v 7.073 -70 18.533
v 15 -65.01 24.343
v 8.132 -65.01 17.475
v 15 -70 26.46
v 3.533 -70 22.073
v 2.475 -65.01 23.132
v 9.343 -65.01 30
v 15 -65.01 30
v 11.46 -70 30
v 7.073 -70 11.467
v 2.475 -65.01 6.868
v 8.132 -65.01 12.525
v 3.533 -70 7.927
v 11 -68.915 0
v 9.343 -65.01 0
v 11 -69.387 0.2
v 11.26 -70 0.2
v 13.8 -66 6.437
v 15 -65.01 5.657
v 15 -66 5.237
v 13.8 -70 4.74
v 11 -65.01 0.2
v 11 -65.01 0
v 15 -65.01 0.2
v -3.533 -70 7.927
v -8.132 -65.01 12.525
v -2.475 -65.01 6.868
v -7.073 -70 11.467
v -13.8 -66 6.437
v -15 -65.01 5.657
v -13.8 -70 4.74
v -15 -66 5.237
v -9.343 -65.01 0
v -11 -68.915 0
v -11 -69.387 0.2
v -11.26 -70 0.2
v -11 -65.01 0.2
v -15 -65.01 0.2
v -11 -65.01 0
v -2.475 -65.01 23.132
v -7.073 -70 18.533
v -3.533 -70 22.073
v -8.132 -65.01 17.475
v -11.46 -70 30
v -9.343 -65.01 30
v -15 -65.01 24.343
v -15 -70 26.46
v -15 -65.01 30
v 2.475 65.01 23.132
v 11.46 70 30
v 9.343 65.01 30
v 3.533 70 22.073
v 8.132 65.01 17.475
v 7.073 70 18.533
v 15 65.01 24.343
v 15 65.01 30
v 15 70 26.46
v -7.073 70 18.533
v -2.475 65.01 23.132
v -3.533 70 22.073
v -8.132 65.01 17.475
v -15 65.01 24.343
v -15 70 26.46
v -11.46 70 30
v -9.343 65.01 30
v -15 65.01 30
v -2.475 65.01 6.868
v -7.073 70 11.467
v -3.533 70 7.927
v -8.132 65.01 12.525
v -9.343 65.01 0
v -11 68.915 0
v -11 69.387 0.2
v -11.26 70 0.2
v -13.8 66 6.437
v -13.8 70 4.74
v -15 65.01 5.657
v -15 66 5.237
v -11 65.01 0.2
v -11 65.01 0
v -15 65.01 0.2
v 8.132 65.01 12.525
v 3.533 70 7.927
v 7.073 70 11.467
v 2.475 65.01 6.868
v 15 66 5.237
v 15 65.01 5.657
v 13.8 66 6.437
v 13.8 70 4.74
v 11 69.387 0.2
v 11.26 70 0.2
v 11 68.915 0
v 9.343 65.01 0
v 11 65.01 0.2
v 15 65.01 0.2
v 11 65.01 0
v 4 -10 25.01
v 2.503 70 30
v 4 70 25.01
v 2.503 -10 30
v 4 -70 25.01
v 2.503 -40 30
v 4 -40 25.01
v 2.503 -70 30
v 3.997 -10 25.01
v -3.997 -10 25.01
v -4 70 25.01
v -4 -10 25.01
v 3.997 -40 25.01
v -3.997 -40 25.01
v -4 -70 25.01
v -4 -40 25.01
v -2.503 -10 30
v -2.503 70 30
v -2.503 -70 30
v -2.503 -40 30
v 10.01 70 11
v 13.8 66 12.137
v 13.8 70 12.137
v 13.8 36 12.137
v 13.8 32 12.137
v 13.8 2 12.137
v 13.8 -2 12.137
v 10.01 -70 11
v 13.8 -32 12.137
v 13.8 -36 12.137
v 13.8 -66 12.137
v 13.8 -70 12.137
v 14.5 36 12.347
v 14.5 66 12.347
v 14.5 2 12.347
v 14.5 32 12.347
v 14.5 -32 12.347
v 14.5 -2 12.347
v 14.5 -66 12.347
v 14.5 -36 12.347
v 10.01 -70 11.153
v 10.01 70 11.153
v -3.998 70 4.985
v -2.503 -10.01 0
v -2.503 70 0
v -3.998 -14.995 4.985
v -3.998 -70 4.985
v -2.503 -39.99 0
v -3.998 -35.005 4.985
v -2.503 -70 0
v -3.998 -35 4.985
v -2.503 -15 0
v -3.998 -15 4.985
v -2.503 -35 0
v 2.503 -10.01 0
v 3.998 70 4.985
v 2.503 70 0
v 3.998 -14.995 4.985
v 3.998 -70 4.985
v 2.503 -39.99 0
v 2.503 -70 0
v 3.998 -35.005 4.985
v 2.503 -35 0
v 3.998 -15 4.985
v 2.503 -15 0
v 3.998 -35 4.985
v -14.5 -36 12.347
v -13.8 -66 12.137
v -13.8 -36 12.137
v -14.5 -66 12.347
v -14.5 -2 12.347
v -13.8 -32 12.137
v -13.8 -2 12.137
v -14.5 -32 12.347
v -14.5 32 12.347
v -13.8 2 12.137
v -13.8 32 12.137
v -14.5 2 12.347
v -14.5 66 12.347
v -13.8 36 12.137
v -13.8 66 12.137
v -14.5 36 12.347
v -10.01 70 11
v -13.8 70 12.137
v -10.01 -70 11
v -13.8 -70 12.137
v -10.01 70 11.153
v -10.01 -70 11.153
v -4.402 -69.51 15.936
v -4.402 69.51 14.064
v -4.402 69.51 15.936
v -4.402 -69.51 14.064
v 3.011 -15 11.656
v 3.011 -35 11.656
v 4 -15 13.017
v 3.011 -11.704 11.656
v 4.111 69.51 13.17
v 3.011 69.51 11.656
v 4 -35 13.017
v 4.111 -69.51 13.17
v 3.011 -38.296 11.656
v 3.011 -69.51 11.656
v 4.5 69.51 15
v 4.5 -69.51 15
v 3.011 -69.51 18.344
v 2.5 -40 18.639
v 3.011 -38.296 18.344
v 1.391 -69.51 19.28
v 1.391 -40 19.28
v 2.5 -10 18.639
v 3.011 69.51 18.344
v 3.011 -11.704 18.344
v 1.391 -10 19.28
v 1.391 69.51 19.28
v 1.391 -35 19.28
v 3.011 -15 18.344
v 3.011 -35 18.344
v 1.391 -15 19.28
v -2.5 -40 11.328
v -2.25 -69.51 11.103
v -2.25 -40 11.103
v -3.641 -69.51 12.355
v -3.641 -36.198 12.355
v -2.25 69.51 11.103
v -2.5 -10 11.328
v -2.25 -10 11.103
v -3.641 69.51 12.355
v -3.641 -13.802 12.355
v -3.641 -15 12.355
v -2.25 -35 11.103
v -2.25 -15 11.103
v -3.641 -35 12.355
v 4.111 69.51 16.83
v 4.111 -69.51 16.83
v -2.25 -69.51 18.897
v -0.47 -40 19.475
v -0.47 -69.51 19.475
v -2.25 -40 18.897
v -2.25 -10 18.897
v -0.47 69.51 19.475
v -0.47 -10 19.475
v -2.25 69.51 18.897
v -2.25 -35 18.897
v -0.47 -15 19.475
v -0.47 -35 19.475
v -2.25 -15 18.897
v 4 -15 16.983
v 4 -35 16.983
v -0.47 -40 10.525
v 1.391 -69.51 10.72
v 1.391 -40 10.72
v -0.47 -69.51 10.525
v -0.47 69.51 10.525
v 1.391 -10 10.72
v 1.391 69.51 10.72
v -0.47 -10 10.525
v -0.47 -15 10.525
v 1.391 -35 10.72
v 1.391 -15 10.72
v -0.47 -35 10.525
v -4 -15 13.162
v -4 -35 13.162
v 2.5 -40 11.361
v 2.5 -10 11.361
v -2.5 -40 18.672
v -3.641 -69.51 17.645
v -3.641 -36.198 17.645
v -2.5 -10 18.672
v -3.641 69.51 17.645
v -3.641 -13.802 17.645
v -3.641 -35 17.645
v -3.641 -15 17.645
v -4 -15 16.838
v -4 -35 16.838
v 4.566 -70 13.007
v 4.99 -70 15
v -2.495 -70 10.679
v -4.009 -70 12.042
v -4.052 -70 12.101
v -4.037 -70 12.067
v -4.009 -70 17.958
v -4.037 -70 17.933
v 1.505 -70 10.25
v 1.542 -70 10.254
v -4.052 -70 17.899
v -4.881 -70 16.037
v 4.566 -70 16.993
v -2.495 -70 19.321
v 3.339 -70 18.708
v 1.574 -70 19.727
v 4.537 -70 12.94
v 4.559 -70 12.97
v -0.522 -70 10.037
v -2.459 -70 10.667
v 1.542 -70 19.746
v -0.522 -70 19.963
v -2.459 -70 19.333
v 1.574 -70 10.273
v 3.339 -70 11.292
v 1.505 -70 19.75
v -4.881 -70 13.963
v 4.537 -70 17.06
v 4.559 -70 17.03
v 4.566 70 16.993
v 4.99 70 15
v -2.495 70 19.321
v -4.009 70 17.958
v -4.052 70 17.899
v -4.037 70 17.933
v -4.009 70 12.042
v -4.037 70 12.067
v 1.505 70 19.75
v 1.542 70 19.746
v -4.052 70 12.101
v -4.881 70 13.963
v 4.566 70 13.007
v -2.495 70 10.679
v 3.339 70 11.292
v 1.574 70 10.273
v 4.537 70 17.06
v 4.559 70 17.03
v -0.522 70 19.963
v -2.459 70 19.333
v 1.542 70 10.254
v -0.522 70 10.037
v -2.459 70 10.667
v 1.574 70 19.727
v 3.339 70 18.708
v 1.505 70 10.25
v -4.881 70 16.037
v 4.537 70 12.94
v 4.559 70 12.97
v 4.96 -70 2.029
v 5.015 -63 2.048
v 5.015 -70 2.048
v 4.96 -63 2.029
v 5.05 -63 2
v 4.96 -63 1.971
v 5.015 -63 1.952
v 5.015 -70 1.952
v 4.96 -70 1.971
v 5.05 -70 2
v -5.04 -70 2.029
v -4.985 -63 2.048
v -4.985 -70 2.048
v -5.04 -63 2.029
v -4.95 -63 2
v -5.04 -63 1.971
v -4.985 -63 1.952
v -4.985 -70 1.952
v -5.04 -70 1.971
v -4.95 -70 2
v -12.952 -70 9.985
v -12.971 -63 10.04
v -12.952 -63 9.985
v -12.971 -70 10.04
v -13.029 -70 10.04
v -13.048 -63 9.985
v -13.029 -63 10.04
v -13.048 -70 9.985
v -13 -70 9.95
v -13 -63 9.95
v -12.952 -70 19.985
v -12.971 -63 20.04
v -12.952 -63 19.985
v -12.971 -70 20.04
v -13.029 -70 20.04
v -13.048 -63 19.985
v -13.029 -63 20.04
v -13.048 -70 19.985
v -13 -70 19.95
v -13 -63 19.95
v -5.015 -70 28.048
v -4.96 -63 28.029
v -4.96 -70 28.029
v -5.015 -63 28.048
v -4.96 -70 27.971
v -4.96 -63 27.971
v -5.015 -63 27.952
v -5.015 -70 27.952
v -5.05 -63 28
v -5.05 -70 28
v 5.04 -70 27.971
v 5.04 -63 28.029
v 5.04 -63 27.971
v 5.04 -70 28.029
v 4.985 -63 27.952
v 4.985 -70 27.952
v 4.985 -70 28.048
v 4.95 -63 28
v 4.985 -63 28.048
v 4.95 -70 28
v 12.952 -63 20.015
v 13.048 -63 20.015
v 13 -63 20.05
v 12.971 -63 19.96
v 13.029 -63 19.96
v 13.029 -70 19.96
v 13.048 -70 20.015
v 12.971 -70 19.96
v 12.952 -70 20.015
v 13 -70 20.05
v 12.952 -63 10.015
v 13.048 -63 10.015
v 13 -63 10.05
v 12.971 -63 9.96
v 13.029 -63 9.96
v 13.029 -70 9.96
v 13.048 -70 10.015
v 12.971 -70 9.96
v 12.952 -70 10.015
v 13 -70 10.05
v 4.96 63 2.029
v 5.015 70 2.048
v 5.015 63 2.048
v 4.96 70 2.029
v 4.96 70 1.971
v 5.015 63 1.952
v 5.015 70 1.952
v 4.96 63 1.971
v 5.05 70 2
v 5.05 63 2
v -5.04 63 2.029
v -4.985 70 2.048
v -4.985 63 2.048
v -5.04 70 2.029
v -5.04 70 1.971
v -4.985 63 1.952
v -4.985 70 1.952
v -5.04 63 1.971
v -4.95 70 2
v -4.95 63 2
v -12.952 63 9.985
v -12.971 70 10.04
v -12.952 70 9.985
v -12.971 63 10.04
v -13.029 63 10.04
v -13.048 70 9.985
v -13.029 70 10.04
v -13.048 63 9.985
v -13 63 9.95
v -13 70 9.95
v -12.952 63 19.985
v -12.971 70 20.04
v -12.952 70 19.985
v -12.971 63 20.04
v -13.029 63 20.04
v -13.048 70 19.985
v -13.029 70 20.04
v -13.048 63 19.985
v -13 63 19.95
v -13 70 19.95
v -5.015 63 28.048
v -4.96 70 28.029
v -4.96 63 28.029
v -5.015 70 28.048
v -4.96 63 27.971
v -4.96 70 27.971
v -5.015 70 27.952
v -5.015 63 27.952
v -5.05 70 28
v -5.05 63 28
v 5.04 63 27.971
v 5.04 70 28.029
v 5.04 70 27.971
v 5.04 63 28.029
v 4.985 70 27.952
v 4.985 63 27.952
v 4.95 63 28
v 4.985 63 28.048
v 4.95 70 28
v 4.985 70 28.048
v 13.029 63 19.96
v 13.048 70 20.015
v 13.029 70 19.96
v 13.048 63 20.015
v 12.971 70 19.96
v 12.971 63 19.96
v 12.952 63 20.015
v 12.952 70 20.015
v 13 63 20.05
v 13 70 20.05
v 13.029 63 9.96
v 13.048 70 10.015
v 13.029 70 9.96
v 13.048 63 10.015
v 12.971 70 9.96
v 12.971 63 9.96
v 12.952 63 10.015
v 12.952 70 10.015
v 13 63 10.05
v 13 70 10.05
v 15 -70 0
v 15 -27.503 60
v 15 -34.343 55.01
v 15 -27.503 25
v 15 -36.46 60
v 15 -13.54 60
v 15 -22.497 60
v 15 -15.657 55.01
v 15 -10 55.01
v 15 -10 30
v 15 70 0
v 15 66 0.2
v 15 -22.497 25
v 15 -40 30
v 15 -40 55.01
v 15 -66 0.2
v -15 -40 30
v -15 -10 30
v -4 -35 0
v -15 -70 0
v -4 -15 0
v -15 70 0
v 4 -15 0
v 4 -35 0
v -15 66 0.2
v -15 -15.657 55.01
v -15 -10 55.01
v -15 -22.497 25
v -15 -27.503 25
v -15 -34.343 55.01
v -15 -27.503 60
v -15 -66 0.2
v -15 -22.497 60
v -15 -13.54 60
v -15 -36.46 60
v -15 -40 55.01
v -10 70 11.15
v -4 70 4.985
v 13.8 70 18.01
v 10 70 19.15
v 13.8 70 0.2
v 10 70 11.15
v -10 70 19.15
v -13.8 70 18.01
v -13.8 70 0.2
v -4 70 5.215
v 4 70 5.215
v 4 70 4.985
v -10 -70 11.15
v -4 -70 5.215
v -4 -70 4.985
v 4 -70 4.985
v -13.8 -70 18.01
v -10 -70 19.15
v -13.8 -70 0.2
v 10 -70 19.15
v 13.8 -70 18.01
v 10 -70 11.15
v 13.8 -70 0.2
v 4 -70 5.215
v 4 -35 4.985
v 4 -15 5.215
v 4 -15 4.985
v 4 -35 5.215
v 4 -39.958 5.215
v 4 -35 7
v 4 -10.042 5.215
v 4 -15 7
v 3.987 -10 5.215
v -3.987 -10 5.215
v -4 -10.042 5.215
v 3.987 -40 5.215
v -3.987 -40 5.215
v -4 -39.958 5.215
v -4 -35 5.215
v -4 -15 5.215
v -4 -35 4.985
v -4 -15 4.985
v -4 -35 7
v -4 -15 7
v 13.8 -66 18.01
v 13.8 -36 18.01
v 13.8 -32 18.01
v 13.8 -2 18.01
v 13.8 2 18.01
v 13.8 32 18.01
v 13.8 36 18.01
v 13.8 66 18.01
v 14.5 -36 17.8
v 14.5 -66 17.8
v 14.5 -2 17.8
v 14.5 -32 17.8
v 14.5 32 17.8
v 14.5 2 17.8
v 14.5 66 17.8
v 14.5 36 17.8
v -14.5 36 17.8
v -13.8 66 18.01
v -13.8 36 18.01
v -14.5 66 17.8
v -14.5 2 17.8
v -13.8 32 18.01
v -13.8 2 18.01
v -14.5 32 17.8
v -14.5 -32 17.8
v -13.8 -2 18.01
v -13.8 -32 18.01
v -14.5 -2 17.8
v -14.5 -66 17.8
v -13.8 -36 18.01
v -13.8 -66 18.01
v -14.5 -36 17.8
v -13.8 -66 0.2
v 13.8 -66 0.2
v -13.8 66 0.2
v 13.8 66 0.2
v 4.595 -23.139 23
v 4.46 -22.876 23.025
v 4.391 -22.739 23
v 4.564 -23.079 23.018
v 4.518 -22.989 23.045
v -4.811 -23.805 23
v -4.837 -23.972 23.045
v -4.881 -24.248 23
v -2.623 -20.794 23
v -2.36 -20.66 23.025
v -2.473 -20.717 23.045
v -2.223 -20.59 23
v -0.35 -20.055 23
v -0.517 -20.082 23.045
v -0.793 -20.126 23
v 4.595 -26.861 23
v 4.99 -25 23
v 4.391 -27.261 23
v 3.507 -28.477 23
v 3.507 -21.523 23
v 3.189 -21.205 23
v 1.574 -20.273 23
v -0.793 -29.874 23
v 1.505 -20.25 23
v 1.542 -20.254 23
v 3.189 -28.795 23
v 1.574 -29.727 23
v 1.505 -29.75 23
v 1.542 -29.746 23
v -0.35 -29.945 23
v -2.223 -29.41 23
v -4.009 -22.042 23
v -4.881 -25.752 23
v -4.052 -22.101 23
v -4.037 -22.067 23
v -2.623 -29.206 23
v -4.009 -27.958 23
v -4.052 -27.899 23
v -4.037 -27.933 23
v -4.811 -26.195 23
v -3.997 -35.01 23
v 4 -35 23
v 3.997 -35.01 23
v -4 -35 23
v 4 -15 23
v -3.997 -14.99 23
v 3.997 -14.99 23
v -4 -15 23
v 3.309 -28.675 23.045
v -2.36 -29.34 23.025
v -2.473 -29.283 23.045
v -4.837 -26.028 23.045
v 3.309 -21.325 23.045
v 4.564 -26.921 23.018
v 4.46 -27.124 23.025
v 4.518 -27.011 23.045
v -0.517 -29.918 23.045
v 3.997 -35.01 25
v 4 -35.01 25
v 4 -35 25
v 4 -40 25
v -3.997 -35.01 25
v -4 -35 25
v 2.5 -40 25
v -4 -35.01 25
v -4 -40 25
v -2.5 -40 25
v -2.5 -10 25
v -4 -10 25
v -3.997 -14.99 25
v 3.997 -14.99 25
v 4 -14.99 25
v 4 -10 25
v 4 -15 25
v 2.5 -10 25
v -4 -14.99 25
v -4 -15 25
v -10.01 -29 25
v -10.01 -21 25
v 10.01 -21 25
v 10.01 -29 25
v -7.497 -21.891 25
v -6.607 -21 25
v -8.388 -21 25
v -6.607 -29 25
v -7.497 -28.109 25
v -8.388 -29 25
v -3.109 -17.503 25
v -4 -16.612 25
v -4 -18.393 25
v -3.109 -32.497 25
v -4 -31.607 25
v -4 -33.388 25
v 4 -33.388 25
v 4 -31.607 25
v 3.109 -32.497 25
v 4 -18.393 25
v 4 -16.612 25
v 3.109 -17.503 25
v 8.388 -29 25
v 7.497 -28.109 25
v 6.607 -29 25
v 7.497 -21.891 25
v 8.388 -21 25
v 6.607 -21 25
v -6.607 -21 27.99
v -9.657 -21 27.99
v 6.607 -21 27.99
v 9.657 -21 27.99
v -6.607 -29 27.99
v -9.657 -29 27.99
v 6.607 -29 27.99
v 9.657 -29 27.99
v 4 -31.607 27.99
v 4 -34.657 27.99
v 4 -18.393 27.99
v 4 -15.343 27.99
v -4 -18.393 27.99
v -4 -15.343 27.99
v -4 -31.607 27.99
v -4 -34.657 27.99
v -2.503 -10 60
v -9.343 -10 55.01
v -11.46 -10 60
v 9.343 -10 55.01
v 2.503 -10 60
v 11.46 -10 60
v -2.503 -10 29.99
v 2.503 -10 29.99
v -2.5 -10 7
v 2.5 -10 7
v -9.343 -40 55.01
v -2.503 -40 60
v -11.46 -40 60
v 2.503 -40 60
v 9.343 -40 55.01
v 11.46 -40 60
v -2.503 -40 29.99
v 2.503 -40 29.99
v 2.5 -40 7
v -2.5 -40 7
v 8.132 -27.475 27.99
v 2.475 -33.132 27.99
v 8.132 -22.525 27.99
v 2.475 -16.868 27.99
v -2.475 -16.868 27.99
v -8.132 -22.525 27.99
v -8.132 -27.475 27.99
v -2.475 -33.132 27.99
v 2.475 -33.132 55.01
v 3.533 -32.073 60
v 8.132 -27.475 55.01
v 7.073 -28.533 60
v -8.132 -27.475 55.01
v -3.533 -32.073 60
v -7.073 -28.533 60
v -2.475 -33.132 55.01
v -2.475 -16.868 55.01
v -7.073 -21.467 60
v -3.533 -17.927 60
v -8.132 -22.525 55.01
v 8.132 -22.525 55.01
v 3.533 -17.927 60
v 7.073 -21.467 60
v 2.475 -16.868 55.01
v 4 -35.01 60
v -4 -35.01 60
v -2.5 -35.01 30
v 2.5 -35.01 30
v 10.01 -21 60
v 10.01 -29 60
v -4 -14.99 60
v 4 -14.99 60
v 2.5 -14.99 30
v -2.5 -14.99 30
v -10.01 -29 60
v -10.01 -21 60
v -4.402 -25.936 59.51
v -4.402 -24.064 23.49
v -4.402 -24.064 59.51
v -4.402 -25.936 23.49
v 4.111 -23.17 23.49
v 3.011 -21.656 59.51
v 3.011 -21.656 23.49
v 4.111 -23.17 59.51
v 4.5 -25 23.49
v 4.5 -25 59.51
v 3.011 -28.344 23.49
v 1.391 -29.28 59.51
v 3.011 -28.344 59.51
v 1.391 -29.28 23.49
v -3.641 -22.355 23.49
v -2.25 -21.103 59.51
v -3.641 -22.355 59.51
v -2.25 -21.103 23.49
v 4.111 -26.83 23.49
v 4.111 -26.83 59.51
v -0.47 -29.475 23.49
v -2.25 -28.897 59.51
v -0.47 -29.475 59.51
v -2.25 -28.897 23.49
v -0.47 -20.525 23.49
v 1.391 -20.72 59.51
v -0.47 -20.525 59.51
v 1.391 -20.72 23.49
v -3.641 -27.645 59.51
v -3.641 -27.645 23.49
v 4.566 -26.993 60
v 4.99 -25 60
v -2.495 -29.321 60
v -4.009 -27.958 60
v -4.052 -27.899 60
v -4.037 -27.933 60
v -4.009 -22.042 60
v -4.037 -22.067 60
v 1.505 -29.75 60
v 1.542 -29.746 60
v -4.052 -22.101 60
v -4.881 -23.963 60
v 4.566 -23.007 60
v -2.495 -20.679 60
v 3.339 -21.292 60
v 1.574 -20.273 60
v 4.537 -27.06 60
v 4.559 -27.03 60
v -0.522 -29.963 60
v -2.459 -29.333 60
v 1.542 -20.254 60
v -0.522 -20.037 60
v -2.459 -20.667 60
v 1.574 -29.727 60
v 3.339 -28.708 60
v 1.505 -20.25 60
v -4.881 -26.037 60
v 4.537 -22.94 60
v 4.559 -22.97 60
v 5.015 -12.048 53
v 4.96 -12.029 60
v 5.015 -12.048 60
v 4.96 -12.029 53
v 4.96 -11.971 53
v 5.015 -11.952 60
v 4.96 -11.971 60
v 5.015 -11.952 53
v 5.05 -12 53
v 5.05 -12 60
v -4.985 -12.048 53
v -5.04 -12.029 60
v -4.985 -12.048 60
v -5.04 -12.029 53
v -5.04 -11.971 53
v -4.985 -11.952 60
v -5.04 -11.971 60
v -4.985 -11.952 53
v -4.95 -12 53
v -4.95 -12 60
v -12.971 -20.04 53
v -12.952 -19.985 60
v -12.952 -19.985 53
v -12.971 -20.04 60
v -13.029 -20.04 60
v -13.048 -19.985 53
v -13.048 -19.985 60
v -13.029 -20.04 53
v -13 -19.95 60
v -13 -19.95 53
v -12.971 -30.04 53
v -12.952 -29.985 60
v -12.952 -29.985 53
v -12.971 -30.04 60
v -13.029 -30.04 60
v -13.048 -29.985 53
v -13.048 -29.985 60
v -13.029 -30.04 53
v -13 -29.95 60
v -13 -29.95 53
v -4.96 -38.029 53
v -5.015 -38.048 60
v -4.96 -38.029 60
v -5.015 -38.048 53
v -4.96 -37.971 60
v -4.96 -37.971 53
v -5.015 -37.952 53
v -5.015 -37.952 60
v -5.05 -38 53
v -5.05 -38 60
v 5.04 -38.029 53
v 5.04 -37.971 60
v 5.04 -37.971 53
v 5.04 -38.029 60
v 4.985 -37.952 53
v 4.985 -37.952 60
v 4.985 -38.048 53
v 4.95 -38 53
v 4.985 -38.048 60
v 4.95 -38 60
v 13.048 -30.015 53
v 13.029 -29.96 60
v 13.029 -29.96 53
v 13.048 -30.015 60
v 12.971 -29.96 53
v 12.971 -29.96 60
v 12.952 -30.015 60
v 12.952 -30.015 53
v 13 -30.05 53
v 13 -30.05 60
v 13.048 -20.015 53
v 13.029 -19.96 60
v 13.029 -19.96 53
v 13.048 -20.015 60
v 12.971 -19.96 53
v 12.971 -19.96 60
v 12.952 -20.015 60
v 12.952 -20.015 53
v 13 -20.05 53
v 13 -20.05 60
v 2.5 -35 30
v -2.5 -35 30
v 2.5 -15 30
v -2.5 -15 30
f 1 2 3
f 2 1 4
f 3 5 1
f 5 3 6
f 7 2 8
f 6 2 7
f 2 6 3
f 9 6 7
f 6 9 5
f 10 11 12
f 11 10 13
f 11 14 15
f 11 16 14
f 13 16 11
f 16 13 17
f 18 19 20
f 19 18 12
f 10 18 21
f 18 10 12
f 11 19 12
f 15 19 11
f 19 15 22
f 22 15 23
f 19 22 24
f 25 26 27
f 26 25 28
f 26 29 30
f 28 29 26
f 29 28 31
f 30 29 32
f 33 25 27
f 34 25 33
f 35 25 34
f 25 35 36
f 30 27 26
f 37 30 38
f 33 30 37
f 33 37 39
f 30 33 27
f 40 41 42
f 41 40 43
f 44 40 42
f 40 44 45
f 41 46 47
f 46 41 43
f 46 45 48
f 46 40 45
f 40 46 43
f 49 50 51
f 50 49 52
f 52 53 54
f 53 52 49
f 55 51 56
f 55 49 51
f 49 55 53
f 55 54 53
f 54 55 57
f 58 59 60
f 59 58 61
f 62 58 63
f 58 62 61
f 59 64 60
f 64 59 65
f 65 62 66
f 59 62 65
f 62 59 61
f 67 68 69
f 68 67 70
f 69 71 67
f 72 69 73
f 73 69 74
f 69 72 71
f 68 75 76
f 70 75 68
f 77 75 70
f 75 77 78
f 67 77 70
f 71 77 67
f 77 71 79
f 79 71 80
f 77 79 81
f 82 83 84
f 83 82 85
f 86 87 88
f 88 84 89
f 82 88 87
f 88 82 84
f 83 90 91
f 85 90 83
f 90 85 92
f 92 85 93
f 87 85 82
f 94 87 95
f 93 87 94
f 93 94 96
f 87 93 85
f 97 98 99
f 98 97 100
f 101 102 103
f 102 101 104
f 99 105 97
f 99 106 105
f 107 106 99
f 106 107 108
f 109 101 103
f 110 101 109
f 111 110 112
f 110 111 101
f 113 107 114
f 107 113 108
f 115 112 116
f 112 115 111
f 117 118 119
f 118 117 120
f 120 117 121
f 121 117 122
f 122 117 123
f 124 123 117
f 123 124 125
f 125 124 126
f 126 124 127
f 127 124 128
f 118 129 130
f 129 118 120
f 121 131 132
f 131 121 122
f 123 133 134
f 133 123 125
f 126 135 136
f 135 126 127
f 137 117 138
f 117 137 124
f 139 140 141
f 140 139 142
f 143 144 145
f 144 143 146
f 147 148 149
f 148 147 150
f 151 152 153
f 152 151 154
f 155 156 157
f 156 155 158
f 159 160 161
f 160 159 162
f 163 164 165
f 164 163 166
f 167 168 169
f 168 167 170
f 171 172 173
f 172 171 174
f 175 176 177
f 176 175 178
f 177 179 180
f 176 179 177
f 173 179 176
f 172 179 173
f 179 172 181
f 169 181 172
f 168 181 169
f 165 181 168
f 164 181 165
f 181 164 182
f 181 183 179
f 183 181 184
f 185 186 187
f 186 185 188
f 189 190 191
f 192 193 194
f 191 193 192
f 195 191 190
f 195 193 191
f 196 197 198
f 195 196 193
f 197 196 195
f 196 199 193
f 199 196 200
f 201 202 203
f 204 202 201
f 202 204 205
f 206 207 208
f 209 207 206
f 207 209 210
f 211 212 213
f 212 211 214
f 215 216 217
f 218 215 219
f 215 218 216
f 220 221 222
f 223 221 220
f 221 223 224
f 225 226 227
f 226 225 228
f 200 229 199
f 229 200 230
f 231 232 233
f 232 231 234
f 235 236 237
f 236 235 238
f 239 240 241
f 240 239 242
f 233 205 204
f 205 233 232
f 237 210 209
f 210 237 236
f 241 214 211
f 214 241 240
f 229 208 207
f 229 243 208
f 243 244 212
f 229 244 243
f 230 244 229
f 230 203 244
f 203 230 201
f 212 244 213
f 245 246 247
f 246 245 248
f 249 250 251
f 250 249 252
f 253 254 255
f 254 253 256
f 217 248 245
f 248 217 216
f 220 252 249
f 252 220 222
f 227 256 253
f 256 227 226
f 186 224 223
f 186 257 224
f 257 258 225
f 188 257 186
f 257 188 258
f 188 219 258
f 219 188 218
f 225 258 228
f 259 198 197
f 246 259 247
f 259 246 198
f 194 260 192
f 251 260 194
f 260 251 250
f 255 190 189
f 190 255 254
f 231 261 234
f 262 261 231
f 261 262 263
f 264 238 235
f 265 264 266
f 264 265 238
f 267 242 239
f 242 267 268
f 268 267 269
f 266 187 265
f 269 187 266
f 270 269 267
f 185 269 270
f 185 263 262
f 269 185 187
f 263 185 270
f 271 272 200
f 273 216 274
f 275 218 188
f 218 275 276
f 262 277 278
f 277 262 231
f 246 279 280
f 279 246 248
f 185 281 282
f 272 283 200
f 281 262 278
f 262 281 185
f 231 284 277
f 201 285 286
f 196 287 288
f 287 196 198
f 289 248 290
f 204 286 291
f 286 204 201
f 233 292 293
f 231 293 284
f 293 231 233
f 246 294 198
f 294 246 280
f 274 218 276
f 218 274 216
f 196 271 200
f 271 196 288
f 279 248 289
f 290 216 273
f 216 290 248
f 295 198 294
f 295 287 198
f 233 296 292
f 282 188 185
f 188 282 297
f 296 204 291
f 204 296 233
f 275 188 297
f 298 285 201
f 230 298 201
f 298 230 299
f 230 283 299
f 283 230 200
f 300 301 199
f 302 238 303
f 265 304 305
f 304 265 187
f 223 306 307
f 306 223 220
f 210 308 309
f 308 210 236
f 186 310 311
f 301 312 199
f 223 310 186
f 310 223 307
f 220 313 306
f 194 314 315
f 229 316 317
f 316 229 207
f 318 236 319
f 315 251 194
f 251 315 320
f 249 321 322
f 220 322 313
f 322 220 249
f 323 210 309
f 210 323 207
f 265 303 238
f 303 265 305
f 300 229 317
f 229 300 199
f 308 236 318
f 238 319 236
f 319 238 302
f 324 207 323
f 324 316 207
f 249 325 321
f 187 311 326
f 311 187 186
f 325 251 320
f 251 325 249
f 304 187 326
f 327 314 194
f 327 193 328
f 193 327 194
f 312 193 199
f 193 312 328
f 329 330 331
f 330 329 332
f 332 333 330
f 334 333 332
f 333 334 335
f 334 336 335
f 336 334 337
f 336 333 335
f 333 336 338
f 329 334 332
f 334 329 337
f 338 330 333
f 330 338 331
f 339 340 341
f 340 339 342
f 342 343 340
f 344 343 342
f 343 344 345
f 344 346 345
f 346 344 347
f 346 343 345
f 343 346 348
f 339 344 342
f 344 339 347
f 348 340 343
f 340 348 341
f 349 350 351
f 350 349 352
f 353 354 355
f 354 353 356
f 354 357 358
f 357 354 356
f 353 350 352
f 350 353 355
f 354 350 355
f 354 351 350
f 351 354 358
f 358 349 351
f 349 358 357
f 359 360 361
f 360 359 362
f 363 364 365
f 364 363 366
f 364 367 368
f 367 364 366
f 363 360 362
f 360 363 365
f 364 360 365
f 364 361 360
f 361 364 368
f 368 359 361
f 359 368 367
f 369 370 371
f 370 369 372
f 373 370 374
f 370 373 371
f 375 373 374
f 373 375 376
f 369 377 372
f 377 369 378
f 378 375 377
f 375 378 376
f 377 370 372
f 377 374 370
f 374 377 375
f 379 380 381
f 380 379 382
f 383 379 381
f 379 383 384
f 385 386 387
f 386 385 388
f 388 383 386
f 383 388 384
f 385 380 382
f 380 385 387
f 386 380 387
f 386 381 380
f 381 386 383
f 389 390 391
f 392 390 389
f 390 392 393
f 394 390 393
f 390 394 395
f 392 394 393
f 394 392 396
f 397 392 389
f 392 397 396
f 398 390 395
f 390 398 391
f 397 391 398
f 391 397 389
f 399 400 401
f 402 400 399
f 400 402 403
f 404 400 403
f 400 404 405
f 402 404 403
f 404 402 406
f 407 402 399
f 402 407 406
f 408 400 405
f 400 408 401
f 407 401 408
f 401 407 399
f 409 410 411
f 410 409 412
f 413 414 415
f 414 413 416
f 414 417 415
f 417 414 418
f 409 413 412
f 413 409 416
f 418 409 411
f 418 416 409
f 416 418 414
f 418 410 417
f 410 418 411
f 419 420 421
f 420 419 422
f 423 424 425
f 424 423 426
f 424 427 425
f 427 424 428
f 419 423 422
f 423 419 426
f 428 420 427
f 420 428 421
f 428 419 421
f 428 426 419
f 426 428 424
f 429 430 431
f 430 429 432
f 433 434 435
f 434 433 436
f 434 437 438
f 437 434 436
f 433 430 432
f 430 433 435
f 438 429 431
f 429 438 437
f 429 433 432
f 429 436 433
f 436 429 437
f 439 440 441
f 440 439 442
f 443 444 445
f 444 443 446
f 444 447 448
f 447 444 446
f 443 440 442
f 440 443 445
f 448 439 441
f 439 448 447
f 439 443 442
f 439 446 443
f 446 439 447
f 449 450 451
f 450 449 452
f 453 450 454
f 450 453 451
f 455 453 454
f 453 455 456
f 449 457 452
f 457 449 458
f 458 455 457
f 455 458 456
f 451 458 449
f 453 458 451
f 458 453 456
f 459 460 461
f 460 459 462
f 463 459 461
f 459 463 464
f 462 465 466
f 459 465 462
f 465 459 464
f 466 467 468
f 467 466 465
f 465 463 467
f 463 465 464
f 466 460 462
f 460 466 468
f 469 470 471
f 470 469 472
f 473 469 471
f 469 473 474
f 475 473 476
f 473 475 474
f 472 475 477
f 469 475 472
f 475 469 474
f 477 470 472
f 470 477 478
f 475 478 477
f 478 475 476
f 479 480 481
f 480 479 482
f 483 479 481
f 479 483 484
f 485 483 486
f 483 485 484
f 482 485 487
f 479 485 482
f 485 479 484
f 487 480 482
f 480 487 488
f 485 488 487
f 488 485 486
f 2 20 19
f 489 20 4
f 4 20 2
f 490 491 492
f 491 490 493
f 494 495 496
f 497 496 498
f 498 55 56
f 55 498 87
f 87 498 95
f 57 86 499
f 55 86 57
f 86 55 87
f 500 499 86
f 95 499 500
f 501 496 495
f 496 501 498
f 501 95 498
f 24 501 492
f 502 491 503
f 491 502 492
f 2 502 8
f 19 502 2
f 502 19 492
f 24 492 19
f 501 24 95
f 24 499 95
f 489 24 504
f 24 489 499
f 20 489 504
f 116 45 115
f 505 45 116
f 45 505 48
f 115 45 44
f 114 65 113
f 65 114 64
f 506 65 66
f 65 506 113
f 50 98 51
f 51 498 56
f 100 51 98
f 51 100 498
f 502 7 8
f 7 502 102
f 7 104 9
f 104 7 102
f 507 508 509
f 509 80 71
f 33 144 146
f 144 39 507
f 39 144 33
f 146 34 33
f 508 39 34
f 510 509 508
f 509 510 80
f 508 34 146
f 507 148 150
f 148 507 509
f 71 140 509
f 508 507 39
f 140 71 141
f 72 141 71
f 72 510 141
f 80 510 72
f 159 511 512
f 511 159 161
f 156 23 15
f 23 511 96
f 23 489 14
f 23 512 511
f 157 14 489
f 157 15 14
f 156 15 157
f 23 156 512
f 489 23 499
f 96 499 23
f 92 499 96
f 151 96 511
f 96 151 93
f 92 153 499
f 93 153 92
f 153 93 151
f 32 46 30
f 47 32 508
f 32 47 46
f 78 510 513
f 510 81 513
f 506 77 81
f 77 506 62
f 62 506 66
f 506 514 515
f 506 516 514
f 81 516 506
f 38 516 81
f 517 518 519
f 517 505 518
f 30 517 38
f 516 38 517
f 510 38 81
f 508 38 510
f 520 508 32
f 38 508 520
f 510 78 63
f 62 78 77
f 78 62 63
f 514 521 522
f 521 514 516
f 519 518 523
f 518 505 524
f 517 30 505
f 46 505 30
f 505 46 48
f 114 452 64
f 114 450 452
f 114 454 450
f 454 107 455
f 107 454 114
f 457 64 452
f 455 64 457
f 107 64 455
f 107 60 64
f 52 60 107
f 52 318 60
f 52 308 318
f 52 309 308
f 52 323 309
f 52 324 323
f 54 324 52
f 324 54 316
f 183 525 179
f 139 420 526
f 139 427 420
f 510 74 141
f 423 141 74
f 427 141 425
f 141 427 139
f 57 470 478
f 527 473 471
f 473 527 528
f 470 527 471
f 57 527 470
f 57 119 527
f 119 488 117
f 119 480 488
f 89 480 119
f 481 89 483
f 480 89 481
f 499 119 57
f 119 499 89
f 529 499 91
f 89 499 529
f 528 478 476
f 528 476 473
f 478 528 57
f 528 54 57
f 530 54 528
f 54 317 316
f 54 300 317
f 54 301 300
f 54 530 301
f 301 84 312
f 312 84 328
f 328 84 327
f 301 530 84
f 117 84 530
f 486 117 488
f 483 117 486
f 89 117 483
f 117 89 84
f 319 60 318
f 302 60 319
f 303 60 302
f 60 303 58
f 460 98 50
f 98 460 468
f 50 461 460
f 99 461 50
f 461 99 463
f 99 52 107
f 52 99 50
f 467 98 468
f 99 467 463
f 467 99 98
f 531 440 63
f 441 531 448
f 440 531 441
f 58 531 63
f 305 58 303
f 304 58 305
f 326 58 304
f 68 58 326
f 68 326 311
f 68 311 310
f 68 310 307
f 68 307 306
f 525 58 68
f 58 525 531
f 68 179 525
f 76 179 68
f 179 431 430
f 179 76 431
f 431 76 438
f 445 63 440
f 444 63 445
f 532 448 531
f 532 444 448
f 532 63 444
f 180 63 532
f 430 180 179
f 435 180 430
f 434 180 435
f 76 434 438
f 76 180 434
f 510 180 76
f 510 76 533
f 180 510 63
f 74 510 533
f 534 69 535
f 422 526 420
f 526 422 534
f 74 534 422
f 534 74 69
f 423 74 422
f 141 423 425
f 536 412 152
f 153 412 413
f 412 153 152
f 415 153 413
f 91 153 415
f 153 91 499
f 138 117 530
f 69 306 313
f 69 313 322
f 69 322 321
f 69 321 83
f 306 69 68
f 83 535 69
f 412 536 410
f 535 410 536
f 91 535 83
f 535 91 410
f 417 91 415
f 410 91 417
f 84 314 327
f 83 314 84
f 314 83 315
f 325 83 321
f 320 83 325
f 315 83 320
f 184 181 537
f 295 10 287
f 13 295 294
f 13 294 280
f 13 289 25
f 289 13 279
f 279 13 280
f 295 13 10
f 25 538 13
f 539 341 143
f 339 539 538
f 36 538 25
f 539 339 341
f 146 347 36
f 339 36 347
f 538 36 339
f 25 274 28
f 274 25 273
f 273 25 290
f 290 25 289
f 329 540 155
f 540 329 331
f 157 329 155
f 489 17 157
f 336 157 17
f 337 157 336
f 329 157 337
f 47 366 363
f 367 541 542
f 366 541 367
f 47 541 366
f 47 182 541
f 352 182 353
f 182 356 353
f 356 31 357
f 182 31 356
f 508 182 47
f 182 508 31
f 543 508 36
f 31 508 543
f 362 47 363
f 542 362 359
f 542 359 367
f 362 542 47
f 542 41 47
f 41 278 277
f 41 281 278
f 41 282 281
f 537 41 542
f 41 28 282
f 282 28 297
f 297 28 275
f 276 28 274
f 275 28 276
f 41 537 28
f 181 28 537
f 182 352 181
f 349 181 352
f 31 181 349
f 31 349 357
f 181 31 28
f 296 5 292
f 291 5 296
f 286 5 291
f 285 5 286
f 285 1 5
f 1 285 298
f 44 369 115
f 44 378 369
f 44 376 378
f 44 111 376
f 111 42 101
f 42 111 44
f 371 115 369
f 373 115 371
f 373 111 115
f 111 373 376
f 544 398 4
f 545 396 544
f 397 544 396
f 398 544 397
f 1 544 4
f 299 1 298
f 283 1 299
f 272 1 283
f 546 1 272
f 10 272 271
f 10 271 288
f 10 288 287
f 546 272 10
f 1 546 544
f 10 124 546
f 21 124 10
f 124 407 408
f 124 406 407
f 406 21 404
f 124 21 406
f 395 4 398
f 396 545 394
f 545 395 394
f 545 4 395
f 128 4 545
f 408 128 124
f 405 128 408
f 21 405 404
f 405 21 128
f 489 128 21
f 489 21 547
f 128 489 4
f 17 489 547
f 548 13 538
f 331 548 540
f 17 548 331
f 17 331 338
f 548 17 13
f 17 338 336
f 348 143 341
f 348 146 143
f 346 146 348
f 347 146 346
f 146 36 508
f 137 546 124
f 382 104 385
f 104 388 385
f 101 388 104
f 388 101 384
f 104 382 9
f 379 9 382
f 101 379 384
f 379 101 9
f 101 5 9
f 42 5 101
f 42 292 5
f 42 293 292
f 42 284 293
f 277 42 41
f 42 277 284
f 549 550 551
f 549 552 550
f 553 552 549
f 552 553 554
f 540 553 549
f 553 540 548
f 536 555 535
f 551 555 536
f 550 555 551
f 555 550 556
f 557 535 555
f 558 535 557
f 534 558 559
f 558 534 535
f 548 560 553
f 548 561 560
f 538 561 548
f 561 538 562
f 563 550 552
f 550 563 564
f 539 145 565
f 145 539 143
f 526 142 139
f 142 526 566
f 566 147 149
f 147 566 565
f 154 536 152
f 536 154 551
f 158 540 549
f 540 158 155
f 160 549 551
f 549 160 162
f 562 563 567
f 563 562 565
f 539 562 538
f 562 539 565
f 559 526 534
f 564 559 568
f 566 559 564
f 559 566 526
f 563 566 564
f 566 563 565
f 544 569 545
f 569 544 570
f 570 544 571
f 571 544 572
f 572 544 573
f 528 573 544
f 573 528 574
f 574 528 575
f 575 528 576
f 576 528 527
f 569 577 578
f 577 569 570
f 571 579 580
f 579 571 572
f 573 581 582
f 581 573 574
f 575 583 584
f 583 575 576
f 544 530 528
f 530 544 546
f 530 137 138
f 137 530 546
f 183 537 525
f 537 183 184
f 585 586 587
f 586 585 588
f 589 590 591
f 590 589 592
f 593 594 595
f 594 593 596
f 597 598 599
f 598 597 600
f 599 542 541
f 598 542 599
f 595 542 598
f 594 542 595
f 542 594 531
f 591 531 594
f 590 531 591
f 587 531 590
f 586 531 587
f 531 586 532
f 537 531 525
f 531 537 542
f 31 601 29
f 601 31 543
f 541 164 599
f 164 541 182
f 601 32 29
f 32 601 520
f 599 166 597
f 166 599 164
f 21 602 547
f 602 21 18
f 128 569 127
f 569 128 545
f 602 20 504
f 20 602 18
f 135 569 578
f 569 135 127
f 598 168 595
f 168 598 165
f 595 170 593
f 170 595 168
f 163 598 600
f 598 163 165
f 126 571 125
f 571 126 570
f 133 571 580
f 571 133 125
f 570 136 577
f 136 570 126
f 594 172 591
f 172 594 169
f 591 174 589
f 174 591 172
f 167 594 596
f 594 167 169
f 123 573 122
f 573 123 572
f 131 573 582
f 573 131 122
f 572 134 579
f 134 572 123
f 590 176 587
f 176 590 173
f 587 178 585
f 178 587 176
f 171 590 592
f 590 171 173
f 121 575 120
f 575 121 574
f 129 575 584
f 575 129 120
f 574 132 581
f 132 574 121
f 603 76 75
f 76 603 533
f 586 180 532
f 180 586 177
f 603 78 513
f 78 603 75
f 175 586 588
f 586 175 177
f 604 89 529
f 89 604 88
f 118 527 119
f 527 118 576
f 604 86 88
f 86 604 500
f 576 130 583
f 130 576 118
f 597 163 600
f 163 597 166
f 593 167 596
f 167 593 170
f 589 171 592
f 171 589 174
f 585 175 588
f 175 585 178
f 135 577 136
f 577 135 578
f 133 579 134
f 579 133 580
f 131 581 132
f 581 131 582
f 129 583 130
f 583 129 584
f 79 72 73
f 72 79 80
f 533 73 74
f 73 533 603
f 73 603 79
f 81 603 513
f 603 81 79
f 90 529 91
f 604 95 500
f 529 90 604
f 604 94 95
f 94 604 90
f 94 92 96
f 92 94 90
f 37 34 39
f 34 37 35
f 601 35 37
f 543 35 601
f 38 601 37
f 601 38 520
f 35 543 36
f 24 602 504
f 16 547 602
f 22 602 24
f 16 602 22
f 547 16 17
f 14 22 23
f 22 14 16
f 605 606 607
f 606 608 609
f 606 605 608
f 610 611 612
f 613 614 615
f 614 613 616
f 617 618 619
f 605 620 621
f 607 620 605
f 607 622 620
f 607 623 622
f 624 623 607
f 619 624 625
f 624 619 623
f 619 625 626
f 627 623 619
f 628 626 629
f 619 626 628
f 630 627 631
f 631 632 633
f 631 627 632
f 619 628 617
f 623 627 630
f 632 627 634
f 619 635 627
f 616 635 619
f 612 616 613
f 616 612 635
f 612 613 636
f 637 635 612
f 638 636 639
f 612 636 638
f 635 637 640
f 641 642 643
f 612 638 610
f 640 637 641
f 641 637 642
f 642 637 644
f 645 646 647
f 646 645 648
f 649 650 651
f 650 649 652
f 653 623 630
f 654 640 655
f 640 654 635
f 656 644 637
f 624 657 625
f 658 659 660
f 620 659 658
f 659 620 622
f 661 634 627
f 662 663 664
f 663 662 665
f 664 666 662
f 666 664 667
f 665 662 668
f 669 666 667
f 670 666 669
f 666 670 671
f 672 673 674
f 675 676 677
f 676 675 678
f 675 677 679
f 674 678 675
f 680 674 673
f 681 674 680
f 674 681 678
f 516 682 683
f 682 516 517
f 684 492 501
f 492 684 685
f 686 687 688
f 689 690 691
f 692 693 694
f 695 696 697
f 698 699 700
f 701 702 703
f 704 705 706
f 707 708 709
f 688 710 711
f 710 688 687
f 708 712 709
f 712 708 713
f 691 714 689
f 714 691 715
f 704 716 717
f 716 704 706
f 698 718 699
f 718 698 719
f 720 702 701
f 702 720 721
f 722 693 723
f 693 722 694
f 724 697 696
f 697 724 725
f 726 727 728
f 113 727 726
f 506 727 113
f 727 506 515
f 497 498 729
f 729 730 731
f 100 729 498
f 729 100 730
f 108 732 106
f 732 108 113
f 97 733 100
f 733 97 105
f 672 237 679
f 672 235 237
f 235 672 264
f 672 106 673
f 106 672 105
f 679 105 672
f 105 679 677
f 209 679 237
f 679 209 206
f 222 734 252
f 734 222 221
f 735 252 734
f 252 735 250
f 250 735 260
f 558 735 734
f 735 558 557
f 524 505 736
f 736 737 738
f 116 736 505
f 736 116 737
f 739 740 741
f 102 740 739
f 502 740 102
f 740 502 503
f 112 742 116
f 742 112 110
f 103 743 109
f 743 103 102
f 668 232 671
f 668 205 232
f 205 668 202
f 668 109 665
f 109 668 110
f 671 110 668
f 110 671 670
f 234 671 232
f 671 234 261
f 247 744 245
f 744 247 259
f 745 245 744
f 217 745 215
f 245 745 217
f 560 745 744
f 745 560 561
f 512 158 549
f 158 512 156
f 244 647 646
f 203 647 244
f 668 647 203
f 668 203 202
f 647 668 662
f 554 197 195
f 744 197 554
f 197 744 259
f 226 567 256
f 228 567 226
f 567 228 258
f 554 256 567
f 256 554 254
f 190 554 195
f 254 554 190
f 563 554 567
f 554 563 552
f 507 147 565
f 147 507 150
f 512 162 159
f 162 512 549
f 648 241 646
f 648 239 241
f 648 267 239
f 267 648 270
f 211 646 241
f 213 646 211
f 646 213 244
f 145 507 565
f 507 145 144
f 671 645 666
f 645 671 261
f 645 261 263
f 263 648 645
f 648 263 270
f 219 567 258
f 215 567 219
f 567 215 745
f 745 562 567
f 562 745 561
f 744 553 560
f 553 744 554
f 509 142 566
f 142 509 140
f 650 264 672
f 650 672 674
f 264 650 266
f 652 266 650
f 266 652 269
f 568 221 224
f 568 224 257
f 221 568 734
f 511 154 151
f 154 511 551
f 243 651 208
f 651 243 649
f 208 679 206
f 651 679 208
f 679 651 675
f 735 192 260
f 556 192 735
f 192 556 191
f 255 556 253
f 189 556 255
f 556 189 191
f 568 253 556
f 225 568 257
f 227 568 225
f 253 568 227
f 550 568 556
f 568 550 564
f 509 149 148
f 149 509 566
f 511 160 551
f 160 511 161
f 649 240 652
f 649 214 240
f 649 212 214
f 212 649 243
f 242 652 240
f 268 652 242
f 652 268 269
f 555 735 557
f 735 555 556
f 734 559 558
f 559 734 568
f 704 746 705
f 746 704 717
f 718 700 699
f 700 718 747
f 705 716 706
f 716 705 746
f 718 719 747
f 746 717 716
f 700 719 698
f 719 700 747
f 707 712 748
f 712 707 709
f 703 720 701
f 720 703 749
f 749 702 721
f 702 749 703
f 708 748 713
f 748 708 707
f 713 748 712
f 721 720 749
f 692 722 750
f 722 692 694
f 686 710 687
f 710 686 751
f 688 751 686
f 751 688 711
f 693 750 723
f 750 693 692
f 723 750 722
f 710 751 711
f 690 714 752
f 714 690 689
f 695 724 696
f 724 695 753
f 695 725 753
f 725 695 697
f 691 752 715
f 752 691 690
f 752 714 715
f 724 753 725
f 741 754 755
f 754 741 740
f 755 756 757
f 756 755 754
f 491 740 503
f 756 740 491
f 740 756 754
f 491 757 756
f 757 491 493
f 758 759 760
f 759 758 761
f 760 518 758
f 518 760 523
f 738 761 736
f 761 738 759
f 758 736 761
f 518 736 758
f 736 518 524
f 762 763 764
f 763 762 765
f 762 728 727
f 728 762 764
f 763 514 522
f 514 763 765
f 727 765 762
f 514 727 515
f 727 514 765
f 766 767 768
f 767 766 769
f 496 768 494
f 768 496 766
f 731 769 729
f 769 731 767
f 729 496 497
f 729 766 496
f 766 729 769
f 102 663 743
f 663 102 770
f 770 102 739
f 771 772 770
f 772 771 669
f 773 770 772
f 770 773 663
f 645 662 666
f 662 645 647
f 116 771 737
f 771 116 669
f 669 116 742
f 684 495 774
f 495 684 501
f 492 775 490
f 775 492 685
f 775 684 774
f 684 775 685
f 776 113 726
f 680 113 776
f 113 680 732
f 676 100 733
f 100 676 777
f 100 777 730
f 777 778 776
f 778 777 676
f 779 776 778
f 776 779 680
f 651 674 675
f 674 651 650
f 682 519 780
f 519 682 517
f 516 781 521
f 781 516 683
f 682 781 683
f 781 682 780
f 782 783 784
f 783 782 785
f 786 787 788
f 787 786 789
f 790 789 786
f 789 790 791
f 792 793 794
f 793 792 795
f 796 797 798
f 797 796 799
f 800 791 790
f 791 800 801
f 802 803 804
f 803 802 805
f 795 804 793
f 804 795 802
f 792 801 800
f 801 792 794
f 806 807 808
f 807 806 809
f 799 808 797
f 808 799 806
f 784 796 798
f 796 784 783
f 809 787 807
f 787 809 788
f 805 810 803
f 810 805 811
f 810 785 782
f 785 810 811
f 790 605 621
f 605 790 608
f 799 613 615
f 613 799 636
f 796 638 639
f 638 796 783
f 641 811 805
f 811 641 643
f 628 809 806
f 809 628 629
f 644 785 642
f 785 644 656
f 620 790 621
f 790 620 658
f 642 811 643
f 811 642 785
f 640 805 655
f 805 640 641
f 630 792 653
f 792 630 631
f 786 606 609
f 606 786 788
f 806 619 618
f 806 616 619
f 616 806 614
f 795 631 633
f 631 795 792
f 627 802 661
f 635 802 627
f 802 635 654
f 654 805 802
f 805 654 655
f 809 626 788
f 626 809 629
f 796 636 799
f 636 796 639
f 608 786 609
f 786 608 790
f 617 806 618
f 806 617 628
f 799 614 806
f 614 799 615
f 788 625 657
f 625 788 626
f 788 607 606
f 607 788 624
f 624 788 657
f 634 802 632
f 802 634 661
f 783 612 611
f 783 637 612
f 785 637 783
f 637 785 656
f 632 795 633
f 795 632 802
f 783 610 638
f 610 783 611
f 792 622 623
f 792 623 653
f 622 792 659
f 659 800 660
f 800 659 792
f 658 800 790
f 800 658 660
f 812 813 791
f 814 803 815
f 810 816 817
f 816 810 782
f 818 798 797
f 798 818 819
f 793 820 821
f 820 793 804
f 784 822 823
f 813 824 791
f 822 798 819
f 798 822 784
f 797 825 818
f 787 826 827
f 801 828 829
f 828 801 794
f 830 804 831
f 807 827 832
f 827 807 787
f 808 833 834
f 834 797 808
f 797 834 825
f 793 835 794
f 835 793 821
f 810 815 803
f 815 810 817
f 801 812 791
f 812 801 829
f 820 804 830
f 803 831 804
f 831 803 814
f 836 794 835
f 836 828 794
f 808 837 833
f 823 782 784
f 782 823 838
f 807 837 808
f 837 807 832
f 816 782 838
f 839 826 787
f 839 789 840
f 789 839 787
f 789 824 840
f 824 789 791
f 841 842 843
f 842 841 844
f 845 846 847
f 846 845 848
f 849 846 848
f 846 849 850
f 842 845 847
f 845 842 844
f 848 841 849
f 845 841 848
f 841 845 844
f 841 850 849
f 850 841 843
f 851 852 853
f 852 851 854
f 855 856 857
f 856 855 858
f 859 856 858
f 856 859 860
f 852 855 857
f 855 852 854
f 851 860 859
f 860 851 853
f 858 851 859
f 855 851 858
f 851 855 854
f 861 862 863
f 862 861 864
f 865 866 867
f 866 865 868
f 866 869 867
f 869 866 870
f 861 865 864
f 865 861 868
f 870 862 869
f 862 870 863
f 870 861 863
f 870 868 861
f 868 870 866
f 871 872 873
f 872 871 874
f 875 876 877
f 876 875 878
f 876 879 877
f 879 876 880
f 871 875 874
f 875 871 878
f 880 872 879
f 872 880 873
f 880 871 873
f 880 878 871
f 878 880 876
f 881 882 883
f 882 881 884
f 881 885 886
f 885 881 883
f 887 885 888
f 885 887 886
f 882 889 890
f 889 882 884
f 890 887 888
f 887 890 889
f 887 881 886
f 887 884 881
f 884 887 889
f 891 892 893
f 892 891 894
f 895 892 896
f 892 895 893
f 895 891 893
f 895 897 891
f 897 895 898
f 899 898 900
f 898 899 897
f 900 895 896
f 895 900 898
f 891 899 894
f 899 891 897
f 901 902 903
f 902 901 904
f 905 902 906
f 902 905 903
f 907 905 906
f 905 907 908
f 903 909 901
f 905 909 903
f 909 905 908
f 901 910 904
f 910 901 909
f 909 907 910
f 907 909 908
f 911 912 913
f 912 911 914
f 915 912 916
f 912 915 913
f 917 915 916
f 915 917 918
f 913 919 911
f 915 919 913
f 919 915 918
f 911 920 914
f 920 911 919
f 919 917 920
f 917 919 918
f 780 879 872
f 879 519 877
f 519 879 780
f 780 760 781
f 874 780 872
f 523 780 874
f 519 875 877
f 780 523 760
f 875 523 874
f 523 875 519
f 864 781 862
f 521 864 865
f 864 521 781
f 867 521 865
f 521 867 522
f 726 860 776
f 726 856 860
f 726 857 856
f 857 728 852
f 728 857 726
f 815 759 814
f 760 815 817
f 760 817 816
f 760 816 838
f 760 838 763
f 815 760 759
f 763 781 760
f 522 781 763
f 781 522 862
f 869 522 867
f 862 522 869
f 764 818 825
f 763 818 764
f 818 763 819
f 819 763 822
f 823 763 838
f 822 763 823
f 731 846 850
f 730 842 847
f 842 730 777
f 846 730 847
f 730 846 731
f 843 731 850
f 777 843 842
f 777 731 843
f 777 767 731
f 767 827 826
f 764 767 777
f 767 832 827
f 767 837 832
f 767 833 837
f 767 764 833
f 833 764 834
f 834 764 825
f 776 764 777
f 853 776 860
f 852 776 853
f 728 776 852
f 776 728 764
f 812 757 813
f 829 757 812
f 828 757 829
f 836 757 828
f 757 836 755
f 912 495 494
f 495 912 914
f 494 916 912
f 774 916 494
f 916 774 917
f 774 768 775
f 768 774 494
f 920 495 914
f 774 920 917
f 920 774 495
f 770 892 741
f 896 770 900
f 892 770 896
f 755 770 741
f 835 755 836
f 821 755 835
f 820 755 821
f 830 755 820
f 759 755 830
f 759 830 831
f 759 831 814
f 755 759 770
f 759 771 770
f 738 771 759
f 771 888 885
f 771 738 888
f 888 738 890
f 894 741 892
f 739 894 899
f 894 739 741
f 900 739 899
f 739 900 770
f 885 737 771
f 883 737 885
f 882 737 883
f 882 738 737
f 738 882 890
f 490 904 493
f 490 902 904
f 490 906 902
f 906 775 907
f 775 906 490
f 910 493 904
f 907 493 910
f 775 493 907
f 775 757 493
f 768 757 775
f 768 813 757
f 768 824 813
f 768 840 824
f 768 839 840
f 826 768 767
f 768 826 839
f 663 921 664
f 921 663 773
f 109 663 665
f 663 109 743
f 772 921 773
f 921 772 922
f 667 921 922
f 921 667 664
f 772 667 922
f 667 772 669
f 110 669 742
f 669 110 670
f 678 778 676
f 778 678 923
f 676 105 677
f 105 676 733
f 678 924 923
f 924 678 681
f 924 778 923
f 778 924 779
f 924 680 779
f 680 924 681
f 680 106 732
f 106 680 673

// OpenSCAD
// file: ../Dollo/NEW_long_ties/globals.scad
/*
Most things in this file is represented as one millimeter, so keep that in mind while changing things.
Some of the setting are not mm but at variables that you can set, such as 2*x=2x and you are setting what x is.
I will try to specify when things are variables and not exact measurements.
*/

// printer slop
slop = 0.15;

obj_leg = 30;
leg_length = 5.5;
small_number = 0.001;
metal_core_rode_global = 5;


///////////////// number of holes /////////////////////
z_hole_number = 8;
other_holes = 8;

///////////////// Pins /////////////////////

//pins that poke out
ball_size = 10;
pin_height = 20;
pin_diameter = 6;


//holes
hole_ball_size = ball_size;
hole_pin_height = pin_height;
hole_pin_diameter = pin_diameter;

///////////////// Z THINGS /////////////////////

berring_slot_width = 7.5;
berring_slot_depth = 6.5;
metal_core_rode = 5;

///////////////// X THINGS /////////////////////

//male dove tails
male_dove_max_width=8;
male_dove_min_width=5;
male_dove_depth=5;
male_dove_height=obj_leg/2;

function scaled_male_dove_max_width() = male_dove_max_width - slop;
function scaled_male_dove_min_width() = male_dove_min_width - slop;
function scaled_male_dove_depth() = male_dove_depth - slop;

//female dove tails, this is found on the y mounts
girl_max_width=11;
girl_min_width=5;
girl_depth=5;
girl_height=obj_leg;


///////////////// Y THINGS /////////////////////
/*
The Y is so normal that all of those global variables at the top should change all of the setting in it, this section is set her incase there are variables set in the future development of this project.
*/

// stepper
motor_side_length = 43.2;
motor_bolt_hole_distance = 31;
motor_center_hole = 23;
motor_shaft_dia = 5;
motor_shaft_hole_dia = 5+2*slop;

// bolts etc.
bolt_hole_dia = 3+2*slop;
bolt_head_hole_dia = 5.8;

m4_bolt_hole_dia = 4+2*slop;
m4_bolt_head_hole_dia = 6.8+2*slop;


m3_nut_side = 5.65;
m3_nut_height = 2.3;
m4_nut_side = 6.85;
m4_nut_height = 3.1;

// threaded rod
lifter_rod_diam = 9.86;
hole_threaded_rod = lifter_rod_diam+2*slop;

// for the extensions
metal_rod_size = 9;
// file: common.scad
// 30mm units per axis
function e_units(length) = (length - 120)/30;

function e_length(units, count) =
    units*30/count;

function t_length(e_length_d) = max(120, e_length_d);

function t_offset(e_length_t) = (190 - e_length_t)/2;


module print_parts(
    width, depth, height, e_count_w,
    e_count_d, e_count_h
) {

    e_units_w = e_units(width);
    e_units_d = e_units(depth);
    e_units_h = e_units(height);

    e_length_w = e_length(e_units_w, e_count_w);
    e_length_d = e_length(e_units_d, e_count_d);
    e_length_h = e_length(e_units_h, e_count_h);

    e_length_t = t_length(e_length_d);
    offset_t = t_offset(e_length_t);

    e_units_dt = e_units(depth - e_length_t);
    e_count_dt = max(1, e_count_d - 1);
    e_length_dt = e_length(e_units_dt, e_count_dt);

    // single printable beam lengths
    echo("Extention lengths (total length, piece lengths)");
    echo("w: ", e_units_w*30, e_length_w);
    echo("h: ", e_units_h*30, e_length_h);
    echo("d: ", e_units_d*30, e_length_d);
    echo("t: ", e_length_t, e_length_t);

    echo("T extention side details (total, pieces)");
    echo("d: ", e_length_dt, e_count_dt);
    
    echo("Extention counts");
    echo("w: ", e_count_w * 4);
    echo("d: ", e_count_d * 4 - 2);
    echo("h: ", e_count_h * 5);
    echo("t: ", 2);
    
}
// file: variables.scad
slop = 0.2;

mount_screw_d = 10;
mount_screw_pitch = 1.5;

motherboard_tray_h = 8;

debug_threads = false;
// file: ../Dollo/NEW_long_ties/long_bow_tie.scad
tilt_level = 1.1;

include <include.scad>;
include <globals.scad>;

obj_leg = 12;

function scale_x() = 1;
function scale_z() = (male_dove_depth-0.2)/male_dove_depth;

length = 50;

// shifts the upper dove to right
_offset = 0;


//long_bow_tie();
//long_bow_tie(25);

//long_bow_tie_half(length);
//long_bow_tie_half(30);
//long_bow_tie_half_split(length);

long_bow_tie_split(length);
//long_bow_tie_split(30);



module bow_tie_master(length){
    dovetail_3d(
        male_dove_max_width,
        male_dove_min_width,
        male_dove_depth,
        length
    );
}

module long_bow_tie_unscaled(length) {

    module endcyl() {
        translate([0, 0, -3])
        cylinder(d=24, h=6, $fn=60);
    }

    module endtub() {
        rotate([0, 90, 0])
        translate([0, 0, -15/2])
        difference() {
            cylinder(d=20, h=15, $fn=60);
            cylinder(d=12, h=16, $fn=60);

            translate([-20, 0, -0.1])
            cube([40, 20, 16]);
        }
    }

    module _half() {

        translate([0, length/2, 0])
        difference() {
            intersection(){
                rotate([90, 0, 0])
                bow_tie_master(length);

                rotate([90, 0, 0])
                cylinder(r=5.8, h=length * 2);
            }
            translate([13, 5, 0])
            rotate([90, 0, 25])
            endcyl();

            translate([-13, 5, 0])
            rotate([90, 0, -25])
            endcyl();

            translate([13, -length - 5, 0])
            rotate([90, 0, -25])
            endcyl();

            translate([-13, -length - 5, 0])
            rotate([90, 0, 25])
            endcyl();

            translate([0, -length + 4.5, 0])
            endtub();

            translate([0, -4.5, 0])
            rotate([180, 0, 0])
            endtub();
        }
    }

    union() {
        translate([_offset, 0, 0])
        _half();

        mirror([0, 0, 1])
        _half();
    }
}

module long_bow_tie(
    length=length, scale_x=scale_x(), 
    scale_z=scale_z(), middle=false) {

    scale([scale_x, 1, scale_z]) {
        if(middle) {
            long_bow_tie_unscaled(length);
        } else {
            translate([0, 0, male_dove_depth])
            long_bow_tie_unscaled(length);
        }
    }
}

module split(length) {
    translate([0, 0, -length/2 - 1])
    linear_extrude(height=length + 2)
    polygon(points=[
        [0, -1.5], [0.9, -1.5], [2, -5],
        [-2, -5], [-0.9, -1.5]
    ]);
}

module long_bow_tie_split(
    length=length, scale_x=scale_x(),
    scale_z=scale_z(), middle=false
) {

    module _do_split() {
        rotate([90, 0, 0])
        difference() {
            rotate([-90, 0, 0])
            long_bow_tie(
                length, scale_x=scale_x,
                scale_z=scale_z, middle=true);

            split(length);

            translate([_offset, 0, 0])
            rotate([0, 0, 180])
            split(length);
        }
    }
        
    if (!middle) {
        translate([0, 0, scale_z * male_dove_depth])
        _do_split();
    } else {
        _do_split();
    }
}

module long_bow_tie_half(
    length=length, scale_x=scale_x(),
    scale_z=scale_z(), middle=true) {

    rotate([0, -90, 0])
    intersection() {
        long_bow_tie(length, middle=middle);

        translate([0, -length/2, -24/2])
        chamfered_cube(
            13, length, 24, 1
        );
    }
}

module long_bow_tie_half_split(
    length=length, scale_x=scale_x(),
    scale_z=scale_z()) {

    union() {
        intersection() {
            long_bow_tie_split(length,
                scale_x=scale_x,
                scale_z=scale_z,
                middle=true);
            translate([0, 0, -6/2])
            cube([10, length, 6], center=true);
        }
        cube([scale_x*male_dove_min_width, length,
              1.6], center=true);

        translate([((scale_x*male_dove_min_width)/2)/2, 0, 4/2])
        cube([(scale_x*male_dove_min_width)/2, length,
              4], center=true);

        translate([0, 0, 4])
        intersection() {
            long_bow_tie(
                length,scale_x=scale_x, scale_z=scale_z,
                middle=true);

            translate([5/2, 0, 5/2])
            cube([5, length, 5], center=true);
        }
    }
}
// file: ../Dollo/NEW_long_ties/long_tie.scad
length = 50;

include <include.scad>;
include <globals.scad>;

use <long_bow_tie.scad>;

$fn=30;

// alter these the get properly fitting parts
scale_x = scale_x();
scale_z = scale_z();
length = 50;

module long_tie(length=length) {
    translate([0,0,scaled_male_dove_depth()]) rotate([0,180,0]) difference(){
        long_bow_tie(length, scale_x=scale_x, scale_z=scale_z);
        translate([-5,-length/2-1,scaled_male_dove_depth()]) cube([10,length+2,male_dove_depth]);
    }
}

module long_tie_split(length=length) {
    union() {
        difference() {
            translate([0,0,-male_dove_depth+slop]) long_bow_tie_split(length);
            translate([0,0, -3.5]) cube([10,length+1,7], center=true);
        }
        translate([0,0, 0.8]) cube([4,length,1.6], center=true);
    }
}

module long_tie_half(length=length) {
    rotate([0,-90,0]) intersection() {
        long_tie(length);
        translate([0,-length/2,0]) cube([5,length,5]);
    }
}

long_tie(length);
//long_tie_half(length);
//long_tie_split(length);
// main file
use <../Dollo/NEW_long_ties/extention.scad>;
use <../Dollo/NEW_long_ties/long_tie.scad>;
use <../Dollo/NEW_long_ties/long_bow_tie.scad>;
include <variables.scad>;

use <common.scad>;

//_extention_t_case(440, 2);
//_extention_t_case(540, 3);
_extention_t_case(400, 2);

//extention_100();
//extention_110();
//extention_120();
//extention_130();
//extention_135();
//extention_140();
//extention_150();
//extention_155();
//extention_310();
//extention_360();




//extention_t_155();
//extention_t_140();

//long_tie_half_20();
//long_tie_half_30();
//long_tie_half_30(lower_z=0.1);

//long_bow_tie_half_30();
//long_bow_tie_half_30(lower_z=0.1);
//long_bow_tie_half_40();
//long_bow_tie_half_40(lower_z=0.1);

//long_bow_tie_50();


module _extention_t_case(
    depth, e_count_d, supports=true
) {
    
    e_units_d = e_units(depth);

    e_length_d = e_length(e_units_d, e_count_d);

    e_length_t = t_length(e_length_d);
    units_t = e_length_t/30;

    echo("Ext_t length", e_length_t);

    offset_t = t_offset(e_length_t);
    echo("Ext_t offset", offset_t);

    extention_t(
        units1=units_t, units2=1,
        _offset=-offset_t, supports=supports
    );
}

module extention_100() {
    extention(100/30);
}

module extention_110() {
    extention(110/30);
}

module extention_120() {
    extention(120/30);
}

module extention_130() {
    extention(130/30);
}

module extention_135() {
    extention(135/30);
}

module extention_140() {
    extention(140/30);
}

module extention_150() {
    extention(150/30);
}

module extention_155() {
    extention(155/30);
}

module extention_310() {
    extention(310/30);
}

module extention_360() {
    extention(360/30);
}

module extention_t_155(supports=true) {
    offset_t = t_offset(155);
    
    units_t = 155/30;

    extention_t(
        units1=units_t, units2=1,
        _offset=-offset_t, supports=supports
    );
}

module extention_t_140(supports=true) {
    offset_t = t_offset(140);
    
    units_t = 140/30;

    extention_t(
        units1=units_t, units2=1,
        _offset=-offset_t, supports=supports
    );
}

module long_tie_half_20(lower_z=0.0) {
    intersection() {
        translate([0, 0, -lower_z])
        long_tie_half(20);

        translate([0, 0, 10/2])
        cube([50, 50, 10], center=true);
    }
}

module long_tie_half_30(lower_z=0.0) {
    intersection() {
        translate([0, 0, -lower_z])
        long_tie_half(30);

        translate([0, 0, 10/2])
        cube([50, 50, 10], center=true);
    }
}

module long_bow_tie_half_30(lower_z=0.0) {
    intersection() {
        translate([0, 0, -lower_z])
        long_bow_tie_half(30);

        translate([0, 0, 10/2])
        cube([50, 50, 10], center=true);
    }
}

module long_bow_tie_half_40(lower_z=0.0) {
    intersection() {
        translate([0, 0, -lower_z])
        long_bow_tie_half(40);

        translate([0, 0, 10/2])
        cube([50, 50, 10], center=true);
    }
}

module long_bow_tie_50() {
    long_bow_tie(50);
}
